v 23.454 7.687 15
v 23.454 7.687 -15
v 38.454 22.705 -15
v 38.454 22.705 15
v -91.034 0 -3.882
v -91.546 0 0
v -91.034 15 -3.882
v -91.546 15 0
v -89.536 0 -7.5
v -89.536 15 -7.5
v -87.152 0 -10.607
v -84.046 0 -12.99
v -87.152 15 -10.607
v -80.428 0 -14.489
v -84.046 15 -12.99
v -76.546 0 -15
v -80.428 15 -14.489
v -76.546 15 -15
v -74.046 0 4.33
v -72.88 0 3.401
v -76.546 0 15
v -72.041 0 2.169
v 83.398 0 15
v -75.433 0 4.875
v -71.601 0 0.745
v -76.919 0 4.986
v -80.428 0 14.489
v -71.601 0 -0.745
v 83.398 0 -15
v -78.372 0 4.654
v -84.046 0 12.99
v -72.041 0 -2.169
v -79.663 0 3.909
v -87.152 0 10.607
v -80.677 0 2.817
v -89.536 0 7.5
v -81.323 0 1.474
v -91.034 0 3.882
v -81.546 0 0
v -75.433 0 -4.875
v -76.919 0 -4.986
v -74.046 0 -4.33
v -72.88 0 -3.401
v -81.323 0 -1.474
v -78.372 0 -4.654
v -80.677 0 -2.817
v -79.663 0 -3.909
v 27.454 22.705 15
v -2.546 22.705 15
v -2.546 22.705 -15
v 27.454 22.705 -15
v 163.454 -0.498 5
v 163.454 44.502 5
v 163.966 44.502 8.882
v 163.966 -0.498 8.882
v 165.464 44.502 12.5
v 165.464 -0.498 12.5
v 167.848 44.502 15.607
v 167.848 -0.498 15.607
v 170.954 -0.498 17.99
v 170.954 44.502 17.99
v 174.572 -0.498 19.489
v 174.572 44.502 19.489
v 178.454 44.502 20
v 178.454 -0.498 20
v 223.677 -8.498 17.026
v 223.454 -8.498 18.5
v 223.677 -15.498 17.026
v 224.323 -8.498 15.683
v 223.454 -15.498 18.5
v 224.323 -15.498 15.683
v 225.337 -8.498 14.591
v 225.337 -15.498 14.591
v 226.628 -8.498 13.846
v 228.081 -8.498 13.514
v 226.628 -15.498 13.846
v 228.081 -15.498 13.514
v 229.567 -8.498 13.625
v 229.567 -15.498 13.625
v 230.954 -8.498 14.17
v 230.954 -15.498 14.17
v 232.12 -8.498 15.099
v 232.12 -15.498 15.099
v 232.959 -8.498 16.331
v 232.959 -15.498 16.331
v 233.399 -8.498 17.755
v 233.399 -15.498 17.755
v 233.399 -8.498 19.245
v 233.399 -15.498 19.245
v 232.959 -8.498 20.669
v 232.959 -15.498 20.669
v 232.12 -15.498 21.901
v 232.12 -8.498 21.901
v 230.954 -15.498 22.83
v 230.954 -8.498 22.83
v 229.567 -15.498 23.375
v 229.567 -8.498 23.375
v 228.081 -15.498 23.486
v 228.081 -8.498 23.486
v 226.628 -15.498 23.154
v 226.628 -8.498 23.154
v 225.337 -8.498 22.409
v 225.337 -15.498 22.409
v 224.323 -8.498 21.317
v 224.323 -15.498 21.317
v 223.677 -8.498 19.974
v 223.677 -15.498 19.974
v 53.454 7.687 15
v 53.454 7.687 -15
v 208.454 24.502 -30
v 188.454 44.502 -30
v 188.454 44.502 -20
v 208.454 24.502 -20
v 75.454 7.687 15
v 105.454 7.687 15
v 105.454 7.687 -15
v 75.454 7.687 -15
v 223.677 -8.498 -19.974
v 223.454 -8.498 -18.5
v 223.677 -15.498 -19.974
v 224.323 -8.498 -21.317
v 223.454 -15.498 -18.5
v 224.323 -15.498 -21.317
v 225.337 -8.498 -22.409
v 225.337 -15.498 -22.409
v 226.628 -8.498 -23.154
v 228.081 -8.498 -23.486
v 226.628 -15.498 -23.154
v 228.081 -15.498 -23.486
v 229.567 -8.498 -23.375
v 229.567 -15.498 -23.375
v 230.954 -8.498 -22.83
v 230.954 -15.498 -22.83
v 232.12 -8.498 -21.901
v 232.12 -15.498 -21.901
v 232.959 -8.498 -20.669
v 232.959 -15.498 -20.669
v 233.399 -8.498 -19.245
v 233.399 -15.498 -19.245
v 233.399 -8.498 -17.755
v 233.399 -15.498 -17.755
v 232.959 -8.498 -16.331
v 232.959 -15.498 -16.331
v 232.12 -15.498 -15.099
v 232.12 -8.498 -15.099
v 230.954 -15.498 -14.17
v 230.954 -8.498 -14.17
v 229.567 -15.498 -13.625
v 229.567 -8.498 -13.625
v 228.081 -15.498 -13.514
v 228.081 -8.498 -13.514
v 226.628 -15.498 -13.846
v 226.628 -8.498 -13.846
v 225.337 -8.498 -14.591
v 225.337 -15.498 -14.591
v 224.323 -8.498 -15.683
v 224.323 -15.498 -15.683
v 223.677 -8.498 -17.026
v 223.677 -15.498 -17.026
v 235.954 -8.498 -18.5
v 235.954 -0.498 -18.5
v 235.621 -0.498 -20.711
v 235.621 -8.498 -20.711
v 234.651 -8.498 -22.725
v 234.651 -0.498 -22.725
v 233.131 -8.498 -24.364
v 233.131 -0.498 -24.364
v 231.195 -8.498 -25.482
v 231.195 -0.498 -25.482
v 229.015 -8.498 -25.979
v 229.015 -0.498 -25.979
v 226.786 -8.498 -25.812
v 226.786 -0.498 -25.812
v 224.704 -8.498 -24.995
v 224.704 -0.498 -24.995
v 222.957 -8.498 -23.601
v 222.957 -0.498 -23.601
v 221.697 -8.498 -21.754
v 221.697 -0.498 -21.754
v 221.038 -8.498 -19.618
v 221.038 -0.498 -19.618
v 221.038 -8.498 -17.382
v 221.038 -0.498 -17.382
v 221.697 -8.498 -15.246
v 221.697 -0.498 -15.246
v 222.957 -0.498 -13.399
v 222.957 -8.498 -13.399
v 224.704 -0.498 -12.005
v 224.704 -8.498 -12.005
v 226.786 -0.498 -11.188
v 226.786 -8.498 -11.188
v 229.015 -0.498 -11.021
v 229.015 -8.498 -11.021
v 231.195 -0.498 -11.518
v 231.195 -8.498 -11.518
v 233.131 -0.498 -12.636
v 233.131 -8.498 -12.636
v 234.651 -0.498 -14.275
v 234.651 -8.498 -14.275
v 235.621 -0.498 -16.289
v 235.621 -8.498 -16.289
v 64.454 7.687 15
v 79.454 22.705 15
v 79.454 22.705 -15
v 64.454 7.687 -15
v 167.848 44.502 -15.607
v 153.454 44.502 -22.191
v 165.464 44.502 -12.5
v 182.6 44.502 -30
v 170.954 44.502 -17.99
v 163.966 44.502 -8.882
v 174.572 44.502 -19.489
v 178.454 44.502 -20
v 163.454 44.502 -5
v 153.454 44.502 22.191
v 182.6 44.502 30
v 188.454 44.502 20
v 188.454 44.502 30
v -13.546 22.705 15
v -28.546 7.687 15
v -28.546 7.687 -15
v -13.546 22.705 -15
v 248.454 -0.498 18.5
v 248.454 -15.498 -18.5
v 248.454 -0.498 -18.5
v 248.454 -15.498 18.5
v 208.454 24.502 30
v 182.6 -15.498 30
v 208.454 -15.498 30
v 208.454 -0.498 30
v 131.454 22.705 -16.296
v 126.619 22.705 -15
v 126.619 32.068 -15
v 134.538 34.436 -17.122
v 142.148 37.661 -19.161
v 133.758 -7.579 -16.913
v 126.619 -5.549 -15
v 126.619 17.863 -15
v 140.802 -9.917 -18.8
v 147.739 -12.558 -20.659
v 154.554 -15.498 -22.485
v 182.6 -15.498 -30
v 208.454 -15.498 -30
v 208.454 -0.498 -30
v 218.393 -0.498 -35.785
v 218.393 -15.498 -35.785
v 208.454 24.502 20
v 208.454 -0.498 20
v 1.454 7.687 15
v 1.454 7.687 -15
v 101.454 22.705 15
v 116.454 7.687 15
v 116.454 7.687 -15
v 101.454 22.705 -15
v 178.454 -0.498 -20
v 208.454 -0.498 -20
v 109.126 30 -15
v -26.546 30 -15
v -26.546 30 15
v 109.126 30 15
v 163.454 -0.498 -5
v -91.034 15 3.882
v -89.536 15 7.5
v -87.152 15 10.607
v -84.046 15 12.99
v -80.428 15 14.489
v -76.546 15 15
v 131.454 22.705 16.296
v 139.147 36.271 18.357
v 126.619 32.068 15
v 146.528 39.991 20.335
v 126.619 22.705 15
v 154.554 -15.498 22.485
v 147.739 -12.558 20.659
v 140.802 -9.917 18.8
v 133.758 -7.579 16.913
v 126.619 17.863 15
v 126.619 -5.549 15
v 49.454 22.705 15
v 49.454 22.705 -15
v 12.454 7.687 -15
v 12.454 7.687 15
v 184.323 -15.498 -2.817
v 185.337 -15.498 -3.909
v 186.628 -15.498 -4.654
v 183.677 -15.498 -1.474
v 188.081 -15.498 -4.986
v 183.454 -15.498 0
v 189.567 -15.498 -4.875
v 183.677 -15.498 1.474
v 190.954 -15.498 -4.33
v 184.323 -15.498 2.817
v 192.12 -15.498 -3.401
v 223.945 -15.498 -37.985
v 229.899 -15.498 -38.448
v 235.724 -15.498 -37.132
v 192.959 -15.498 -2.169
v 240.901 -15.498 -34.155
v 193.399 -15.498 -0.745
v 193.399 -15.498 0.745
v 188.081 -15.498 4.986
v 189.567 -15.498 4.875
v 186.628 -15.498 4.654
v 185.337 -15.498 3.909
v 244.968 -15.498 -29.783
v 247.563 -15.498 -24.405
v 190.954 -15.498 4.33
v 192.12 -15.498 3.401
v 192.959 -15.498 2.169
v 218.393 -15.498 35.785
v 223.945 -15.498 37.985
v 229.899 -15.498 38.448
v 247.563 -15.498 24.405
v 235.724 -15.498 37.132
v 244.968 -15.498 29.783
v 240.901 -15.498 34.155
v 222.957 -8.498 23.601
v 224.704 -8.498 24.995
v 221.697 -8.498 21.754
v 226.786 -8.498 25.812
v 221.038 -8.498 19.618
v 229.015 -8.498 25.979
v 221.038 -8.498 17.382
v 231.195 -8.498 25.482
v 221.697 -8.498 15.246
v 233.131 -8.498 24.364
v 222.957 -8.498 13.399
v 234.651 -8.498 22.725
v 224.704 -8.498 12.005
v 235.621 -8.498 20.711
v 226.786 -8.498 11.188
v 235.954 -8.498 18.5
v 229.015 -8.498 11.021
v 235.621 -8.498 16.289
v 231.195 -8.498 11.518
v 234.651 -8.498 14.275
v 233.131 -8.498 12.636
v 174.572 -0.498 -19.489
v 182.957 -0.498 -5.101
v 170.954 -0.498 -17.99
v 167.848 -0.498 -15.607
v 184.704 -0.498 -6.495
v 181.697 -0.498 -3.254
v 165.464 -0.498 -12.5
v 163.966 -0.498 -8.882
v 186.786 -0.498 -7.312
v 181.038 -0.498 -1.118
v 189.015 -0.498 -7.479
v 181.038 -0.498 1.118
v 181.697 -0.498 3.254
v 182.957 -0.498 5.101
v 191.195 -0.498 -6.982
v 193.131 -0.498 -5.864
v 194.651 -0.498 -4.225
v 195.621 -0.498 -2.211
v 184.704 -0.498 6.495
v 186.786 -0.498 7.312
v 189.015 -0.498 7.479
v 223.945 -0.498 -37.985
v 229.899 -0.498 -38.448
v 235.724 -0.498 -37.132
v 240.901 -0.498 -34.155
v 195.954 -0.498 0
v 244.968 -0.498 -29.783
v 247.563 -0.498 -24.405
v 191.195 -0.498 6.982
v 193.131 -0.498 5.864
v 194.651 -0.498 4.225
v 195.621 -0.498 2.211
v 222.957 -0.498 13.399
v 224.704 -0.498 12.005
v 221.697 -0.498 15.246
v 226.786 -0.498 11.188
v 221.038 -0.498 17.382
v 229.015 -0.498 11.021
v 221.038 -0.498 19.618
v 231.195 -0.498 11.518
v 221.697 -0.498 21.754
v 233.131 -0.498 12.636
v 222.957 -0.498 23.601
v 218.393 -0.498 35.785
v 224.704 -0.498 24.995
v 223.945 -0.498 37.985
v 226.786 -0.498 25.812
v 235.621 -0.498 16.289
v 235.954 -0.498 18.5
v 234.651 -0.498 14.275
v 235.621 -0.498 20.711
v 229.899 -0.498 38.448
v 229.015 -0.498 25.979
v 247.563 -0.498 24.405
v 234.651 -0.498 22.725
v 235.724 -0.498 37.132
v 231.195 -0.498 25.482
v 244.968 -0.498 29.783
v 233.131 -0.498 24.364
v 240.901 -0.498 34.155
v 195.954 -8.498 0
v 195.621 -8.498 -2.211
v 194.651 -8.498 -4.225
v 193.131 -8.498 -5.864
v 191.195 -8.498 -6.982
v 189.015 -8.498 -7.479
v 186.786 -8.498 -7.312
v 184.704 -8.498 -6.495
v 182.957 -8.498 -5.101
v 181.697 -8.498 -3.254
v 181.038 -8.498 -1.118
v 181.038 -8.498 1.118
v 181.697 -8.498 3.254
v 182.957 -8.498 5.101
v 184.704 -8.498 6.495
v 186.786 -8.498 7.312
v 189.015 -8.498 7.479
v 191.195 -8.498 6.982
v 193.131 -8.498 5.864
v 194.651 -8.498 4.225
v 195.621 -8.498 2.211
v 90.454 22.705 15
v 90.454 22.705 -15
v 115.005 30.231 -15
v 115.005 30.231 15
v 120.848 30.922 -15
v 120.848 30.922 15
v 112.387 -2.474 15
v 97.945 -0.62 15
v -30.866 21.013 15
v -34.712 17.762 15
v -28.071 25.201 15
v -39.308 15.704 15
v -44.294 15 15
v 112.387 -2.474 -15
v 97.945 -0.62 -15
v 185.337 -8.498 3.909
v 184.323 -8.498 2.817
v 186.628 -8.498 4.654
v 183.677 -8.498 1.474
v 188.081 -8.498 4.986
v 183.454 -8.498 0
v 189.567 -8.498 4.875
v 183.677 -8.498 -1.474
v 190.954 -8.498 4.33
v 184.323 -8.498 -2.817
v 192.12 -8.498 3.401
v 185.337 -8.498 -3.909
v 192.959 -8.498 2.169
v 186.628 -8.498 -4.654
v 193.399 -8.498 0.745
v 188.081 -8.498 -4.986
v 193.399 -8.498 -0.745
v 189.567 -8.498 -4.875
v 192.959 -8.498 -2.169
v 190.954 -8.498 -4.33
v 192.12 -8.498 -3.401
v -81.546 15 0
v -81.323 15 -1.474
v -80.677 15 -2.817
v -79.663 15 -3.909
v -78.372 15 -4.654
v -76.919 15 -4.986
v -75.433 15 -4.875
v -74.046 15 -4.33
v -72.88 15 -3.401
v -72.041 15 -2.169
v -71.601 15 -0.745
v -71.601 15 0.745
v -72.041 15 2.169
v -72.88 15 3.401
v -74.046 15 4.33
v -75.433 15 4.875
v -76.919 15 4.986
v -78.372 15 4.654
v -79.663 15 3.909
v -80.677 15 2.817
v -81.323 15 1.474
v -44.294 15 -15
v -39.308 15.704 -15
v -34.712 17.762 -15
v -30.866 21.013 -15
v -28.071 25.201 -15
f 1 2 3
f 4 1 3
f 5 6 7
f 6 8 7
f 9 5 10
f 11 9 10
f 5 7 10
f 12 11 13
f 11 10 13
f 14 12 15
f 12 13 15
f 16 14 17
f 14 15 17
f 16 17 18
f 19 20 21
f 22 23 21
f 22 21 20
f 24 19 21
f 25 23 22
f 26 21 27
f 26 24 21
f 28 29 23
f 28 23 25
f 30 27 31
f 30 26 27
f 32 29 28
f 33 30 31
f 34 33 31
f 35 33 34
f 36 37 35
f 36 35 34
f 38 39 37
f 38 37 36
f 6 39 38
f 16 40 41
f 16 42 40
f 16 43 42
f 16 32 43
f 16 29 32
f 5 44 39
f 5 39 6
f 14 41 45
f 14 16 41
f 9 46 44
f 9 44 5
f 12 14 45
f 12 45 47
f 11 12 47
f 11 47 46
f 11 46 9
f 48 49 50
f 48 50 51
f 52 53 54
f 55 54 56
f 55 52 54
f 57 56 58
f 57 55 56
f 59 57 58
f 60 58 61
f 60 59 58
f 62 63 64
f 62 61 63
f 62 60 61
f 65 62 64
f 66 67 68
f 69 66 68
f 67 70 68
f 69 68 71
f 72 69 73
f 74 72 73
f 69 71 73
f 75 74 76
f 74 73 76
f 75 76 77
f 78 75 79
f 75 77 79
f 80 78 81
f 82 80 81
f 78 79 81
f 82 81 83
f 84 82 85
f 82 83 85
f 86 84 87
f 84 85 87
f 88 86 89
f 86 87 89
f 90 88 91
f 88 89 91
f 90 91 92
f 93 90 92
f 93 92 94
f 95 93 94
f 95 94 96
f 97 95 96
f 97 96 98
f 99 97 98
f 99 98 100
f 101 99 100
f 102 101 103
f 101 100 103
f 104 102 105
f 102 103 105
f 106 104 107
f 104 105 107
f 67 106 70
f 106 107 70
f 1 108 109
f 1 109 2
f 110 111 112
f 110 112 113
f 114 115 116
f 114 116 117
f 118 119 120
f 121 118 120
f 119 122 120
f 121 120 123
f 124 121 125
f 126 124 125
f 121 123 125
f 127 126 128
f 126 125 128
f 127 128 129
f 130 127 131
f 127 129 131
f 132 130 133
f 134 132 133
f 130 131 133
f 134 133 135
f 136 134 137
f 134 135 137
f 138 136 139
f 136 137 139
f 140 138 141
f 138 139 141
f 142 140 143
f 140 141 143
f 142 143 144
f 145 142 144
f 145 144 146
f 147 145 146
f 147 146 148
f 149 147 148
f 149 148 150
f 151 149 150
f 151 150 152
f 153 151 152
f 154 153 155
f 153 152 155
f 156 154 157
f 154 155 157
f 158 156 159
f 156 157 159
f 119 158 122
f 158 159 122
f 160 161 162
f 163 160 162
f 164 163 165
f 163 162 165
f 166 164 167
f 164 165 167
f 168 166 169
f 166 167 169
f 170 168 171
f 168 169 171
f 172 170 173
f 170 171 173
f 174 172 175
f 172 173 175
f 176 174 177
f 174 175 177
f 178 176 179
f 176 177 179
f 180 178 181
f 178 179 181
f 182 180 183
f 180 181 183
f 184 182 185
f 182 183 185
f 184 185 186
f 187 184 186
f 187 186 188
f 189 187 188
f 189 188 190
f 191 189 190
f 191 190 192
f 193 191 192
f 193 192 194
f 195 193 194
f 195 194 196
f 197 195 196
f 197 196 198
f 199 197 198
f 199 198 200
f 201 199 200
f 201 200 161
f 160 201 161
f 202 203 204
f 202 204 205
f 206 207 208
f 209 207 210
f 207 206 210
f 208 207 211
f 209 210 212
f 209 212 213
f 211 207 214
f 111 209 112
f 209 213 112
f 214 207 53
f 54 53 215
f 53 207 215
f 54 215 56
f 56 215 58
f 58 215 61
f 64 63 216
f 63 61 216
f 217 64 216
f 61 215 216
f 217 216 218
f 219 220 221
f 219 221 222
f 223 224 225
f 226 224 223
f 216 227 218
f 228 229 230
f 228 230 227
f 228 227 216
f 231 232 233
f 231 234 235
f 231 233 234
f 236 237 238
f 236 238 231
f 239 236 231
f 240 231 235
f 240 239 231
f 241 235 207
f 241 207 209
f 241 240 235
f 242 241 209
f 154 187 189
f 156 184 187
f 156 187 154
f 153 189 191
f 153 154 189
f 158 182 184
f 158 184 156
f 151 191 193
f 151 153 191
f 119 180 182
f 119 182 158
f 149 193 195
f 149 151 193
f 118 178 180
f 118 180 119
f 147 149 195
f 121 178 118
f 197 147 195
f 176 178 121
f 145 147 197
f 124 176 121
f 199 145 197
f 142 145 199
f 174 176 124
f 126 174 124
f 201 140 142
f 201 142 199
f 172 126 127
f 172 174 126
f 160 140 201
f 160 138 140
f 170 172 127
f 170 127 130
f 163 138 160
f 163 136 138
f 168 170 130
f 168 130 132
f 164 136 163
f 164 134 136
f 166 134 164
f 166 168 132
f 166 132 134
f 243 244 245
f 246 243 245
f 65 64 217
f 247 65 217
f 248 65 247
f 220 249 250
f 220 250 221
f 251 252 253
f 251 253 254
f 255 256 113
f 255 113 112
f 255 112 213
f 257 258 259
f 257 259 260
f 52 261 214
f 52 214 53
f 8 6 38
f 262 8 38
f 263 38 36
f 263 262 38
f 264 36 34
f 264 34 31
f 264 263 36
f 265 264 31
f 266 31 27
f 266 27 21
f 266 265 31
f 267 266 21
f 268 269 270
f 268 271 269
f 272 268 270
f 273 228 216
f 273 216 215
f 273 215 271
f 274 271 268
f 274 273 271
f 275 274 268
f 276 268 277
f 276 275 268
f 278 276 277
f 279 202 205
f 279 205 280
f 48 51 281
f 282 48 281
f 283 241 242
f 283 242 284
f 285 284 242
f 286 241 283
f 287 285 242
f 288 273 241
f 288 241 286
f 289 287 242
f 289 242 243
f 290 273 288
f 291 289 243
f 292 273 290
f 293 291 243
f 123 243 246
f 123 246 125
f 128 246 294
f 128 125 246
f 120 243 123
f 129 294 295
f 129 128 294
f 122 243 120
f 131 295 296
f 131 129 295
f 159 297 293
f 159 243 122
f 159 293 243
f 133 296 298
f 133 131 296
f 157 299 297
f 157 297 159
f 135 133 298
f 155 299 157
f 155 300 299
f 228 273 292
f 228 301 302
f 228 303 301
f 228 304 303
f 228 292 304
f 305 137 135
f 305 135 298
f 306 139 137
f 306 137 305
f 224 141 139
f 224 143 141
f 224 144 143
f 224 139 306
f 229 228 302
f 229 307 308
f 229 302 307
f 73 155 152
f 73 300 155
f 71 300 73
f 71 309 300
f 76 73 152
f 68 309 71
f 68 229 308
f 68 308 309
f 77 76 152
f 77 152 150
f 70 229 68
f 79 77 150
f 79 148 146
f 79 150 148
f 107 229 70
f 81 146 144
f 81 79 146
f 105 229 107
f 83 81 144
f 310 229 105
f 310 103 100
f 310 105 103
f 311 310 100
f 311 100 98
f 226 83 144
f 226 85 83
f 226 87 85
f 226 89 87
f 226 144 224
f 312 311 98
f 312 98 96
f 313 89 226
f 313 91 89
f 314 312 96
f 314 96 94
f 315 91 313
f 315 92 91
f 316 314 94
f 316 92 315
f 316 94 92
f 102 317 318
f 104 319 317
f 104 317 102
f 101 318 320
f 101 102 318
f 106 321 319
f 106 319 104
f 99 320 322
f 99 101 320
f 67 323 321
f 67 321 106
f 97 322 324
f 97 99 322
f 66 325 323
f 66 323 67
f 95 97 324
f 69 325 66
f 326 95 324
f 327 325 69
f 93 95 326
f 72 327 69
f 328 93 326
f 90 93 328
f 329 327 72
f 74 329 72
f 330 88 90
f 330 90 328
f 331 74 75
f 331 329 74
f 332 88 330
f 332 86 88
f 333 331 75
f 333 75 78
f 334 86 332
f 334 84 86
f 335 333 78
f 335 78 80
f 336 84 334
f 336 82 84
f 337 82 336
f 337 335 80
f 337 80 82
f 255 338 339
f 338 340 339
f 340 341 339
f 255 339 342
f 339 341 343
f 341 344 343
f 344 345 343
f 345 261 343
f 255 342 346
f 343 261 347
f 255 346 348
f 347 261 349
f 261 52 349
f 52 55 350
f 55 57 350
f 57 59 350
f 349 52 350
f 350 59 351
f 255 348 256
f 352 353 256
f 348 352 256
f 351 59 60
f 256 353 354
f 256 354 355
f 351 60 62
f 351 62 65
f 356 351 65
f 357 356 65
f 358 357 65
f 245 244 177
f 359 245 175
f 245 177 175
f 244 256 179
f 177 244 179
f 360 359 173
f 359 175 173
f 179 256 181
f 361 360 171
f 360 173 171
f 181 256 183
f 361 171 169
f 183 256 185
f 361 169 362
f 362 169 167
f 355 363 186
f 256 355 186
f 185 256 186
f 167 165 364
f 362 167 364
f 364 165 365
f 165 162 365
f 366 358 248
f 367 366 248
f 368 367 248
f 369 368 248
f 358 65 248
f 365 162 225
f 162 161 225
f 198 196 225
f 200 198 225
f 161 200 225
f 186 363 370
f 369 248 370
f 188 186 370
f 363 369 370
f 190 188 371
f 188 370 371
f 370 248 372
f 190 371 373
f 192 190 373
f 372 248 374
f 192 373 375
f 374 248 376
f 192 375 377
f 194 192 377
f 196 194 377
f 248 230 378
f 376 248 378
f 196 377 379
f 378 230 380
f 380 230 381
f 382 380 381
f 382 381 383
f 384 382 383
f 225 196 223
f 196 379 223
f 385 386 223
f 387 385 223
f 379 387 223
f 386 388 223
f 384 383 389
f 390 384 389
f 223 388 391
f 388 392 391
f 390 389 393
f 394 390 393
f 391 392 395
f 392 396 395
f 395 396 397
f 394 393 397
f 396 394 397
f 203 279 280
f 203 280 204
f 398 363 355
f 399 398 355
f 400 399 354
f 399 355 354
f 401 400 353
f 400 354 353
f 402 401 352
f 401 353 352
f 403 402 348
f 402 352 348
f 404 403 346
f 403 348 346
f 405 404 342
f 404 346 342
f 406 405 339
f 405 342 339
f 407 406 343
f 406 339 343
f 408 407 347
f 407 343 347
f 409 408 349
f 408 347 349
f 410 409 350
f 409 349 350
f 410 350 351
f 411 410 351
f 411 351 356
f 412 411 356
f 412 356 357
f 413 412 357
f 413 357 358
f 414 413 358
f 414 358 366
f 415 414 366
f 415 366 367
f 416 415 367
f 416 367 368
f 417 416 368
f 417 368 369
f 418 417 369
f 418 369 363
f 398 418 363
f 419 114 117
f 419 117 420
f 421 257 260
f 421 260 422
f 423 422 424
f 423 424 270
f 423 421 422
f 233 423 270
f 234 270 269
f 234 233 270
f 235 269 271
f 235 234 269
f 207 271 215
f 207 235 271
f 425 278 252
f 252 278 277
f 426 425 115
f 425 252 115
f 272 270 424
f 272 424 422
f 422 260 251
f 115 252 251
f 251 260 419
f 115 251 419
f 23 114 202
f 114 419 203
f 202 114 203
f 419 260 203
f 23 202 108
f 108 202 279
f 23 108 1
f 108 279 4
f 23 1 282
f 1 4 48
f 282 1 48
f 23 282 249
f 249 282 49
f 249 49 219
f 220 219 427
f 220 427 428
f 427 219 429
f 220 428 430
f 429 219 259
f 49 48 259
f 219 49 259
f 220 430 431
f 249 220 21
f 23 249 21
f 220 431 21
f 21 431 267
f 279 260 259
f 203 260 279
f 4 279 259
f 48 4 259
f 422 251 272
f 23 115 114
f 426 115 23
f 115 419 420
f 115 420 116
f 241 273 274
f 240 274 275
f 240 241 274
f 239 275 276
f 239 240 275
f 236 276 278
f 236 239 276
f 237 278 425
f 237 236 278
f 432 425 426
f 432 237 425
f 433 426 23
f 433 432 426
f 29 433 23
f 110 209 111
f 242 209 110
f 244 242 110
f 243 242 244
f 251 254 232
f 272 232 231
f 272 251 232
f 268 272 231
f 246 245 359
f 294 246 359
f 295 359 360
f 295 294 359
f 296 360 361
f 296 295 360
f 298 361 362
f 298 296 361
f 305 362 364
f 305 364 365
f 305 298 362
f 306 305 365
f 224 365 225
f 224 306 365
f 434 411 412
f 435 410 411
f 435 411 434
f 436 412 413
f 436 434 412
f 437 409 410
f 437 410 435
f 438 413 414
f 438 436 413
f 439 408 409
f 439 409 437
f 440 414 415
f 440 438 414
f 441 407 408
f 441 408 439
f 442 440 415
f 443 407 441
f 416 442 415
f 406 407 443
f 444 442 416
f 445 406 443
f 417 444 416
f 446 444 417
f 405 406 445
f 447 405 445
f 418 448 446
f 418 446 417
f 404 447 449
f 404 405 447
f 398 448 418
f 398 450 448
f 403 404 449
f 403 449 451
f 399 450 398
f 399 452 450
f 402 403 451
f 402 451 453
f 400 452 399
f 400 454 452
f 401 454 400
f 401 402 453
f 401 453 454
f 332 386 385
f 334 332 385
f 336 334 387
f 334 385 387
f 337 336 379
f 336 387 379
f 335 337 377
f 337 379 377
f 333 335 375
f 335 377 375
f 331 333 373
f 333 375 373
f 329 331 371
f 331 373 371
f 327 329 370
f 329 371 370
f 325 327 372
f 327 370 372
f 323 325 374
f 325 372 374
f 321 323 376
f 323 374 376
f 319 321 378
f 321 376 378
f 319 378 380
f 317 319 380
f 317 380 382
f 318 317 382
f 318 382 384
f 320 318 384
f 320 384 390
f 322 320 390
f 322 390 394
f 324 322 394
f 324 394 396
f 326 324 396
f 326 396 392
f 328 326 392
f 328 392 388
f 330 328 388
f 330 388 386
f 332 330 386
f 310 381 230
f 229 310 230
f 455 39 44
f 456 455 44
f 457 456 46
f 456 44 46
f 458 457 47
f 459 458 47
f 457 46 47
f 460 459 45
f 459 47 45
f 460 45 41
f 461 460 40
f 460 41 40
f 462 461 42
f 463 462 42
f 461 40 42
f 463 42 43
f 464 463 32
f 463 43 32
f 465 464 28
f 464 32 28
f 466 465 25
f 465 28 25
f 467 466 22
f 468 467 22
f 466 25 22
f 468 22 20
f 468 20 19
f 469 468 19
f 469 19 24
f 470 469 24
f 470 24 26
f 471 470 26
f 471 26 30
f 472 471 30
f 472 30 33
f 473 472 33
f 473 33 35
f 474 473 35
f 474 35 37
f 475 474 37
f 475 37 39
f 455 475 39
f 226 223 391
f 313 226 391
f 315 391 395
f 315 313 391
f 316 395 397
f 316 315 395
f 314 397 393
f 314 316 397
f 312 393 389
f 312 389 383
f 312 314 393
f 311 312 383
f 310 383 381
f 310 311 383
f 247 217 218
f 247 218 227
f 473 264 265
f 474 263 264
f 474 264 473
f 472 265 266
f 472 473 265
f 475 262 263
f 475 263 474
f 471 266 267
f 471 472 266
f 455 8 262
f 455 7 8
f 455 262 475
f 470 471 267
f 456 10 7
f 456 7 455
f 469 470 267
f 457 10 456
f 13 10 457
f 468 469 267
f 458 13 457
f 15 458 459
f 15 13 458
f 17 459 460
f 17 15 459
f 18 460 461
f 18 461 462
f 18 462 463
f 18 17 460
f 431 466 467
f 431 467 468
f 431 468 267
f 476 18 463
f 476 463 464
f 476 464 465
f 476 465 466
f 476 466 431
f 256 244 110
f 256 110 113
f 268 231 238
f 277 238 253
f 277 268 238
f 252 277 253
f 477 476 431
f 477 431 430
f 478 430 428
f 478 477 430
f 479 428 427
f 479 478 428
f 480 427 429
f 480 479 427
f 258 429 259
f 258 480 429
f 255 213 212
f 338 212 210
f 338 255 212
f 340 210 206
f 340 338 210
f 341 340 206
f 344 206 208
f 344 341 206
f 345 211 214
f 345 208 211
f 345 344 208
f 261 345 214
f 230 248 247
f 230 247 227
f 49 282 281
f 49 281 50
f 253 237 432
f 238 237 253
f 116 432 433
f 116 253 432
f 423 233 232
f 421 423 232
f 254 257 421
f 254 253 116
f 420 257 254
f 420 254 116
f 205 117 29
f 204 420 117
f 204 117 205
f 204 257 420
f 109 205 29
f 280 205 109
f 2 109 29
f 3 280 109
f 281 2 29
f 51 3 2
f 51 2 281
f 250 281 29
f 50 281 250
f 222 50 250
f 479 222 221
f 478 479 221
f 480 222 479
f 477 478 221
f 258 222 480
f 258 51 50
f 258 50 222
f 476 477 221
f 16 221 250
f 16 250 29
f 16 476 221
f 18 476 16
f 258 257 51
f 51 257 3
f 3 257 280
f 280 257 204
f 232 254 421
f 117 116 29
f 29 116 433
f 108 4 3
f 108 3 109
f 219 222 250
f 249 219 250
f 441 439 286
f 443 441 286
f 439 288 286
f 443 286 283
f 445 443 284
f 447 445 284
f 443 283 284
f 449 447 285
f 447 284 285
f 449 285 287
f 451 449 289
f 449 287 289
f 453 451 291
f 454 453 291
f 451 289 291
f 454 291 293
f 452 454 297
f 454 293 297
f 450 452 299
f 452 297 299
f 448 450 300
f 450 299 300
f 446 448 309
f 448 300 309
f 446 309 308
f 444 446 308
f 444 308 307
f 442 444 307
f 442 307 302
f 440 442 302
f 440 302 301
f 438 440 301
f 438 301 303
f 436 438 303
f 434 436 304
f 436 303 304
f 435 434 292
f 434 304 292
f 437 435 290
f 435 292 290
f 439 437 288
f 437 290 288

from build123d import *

# Parameters (mm, degrees)
BOSS_EXTRUDE1_DEPTH                     = 15
BOSS_EXTRUDE1_DEPTH_BACK                = 15
FILLET1_R                               = 15
BOSS_EXTRUDE2_DEPTH                     = 60
CUT_EXTRUDE5_DEPTH                      = 43
CUT_EXTRUDE5_DEPTH_BACK                 = 43
SKETCH1_6_OUTSIDE_W                     = 364.354
SKETCH1_6_OUTSIDE_H                     = 124.354
BOSS_EXTRUDE3_DEPTH                     = 15
CUT_EXTRUDE7_DEPTH                      = 256.415087263
CBORE_FOR_M5_HEX_HEAD_BOLT1_D           = 10
CBORE_FOR_M5_HEX_HEAD_BOLT1_DEPTH       = 20
CBORE_FOR_M5_HEX_HEAD_BOLT1_CBORE_D     = 15
CBORE_FOR_M5_HEX_HEAD_BOLT1_CBORE_DEPTH = 8
CBORE_FOR_M5_HEX_HEAD_BOLT1_TIP         = 3.004303095
F_10_0MM_DOWEL_HOLE1_D                  = 10
CUT_EXTRUDE9_DEPTH                      = 259.016066246
CUT_EXTRUDE14_DEPTH                     = 259.016066246


with BuildPart() as part:
    # Sketch1 → Boss-Extrude1 (new, two sides: drawn at the far end of the back side and taken through both)
    with BuildSketch(Plane.XY.offset(-BOSS_EXTRUDE1_DEPTH_BACK)):
        with BuildLine():
            Line((0, 0), (-91.545543809, 0))
            Line((-91.545543809, 0), (-91.545543809, 15))
            Line((-91.545543809, 15), (-44.293783158, 15))
            ThreePointArc((-44.293783158, 15), (-32.674833119, 19.252272915), (-26.545543809, 30))
            Line((-26.545543809, 30), (109.126292876, 30))
            ThreePointArc((109.126292876, 30), (132.446309196, 33.71762603), (153.454456191, 44.501950965))
            Line((153.454456191, 44.501950965), (188.454456191, 44.501950965))
            Line((188.454456191, 44.501950965), (208.454456191, 24.501950965))
            Line((208.454456191, 24.501950965), (208.454456191, 0))
            Line((208.454456191, 0), (208.454456191, -15.498049035))
            Line((208.454456191, -15.498049035), (154.553796185, -15.498049035))
            ThreePointArc((154.553796185, -15.498049035), (119.809900794, -3.919403897), (83.397793421, 0))
            Line((83.397793421, 0), (0, 0))
        make_face()
    extrude(amount=BOSS_EXTRUDE1_DEPTH + BOSS_EXTRUDE1_DEPTH_BACK)

    # Fillet1
    fillet1_edges = [part.edges().sort_by_distance(p)[0] for p in [
        (-91.545543809, 7.5, 15),
        (-91.545543809, 7.5, -15),
    ]]
    fillet(fillet1_edges, radius=FILLET1_R - 0.0001)  # a hair under: the kernel refuses the full size

    # Sketch2 → Boss-Extrude2 (add)
    with BuildSketch(Plane.XZ.offset(15.498049035)):
        Polygon((126.618755864, -15), (153.454456191, -22.190604231), (182.599517977, -30), (208.454456191, -30), (208.454456191, 30), (182.599517977, 30), (153.454456191, 22.190604231), (126.618755864, 15), align=None)
    extrude(amount=-BOSS_EXTRUDE2_DEPTH)

    # Sketch1<6> outside → Cut-Extrude5 (cut, two sides: drawn at the far end of the back side and taken through both)
    with BuildSketch(Plane.XY.offset(-CUT_EXTRUDE5_DEPTH_BACK)):
        with Locations((58.454, 14.502)):
            Rectangle(SKETCH1_6_OUTSIDE_W, SKETCH1_6_OUTSIDE_H)
        with BuildLine():
            Line((0, 0), (-91.545543809, 0))
            Line((-91.545543809, 0), (-91.545543809, 15))
            Line((-91.545543809, 15), (-44.293783158, 15))
            ThreePointArc((-44.293783158, 15), (-32.674833119, 19.252272915), (-26.545543809, 30))
            Line((-26.545543809, 30), (109.126292876, 30))
            ThreePointArc((109.126292876, 30), (132.446309196, 33.71762603), (153.454456191, 44.501950965))
            Line((153.454456191, 44.501950965), (188.454456191, 44.501950965))
            Line((188.454456191, 44.501950965), (208.454456191, 24.501950965))
            Line((208.454456191, 24.501950965), (208.454456191, 0))
            Line((208.454456191, 0), (208.454456191, -15.498049035))
            Line((208.454456191, -15.498049035), (154.553796185, -15.498049035))
            ThreePointArc((154.553796185, -15.498049035), (119.809900794, -3.919403897), (83.397793421, 0))
            Line((83.397793421, 0), (0, 0))
        make_face(mode=Mode.SUBTRACT)
    extrude(amount=CUT_EXTRUDE5_DEPTH + CUT_EXTRUDE5_DEPTH_BACK, mode=Mode.SUBTRACT)

    # Sketch3 → Boss-Extrude3 (add)
    with BuildSketch(Plane.XZ.offset(15.498049035)):
        with BuildLine():
            Line((208.454456191, -30), (218.39339466, -35.78511038))
            ThreePointArc((218.39339466, -35.78511038), (238.423878677, -35.838126061), (248.454456191, -18.5))
            Line((248.454456191, -18.5), (248.454456191, 18.5))
            ThreePointArc((248.454456191, 18.5), (238.423878677, 35.838126061), (218.39339466, 35.78511038))
            Line((218.39339466, 35.78511038), (208.454456191, 30))
            Line((208.454456191, 30), (208.454456191, -30))
        make_face()
    extrude(amount=-BOSS_EXTRUDE3_DEPTH)

    # Sketch4 → Cut-Extrude7 (cut, through all)
    with BuildSketch(Plane(origin=(0, -0.498049035, 0), x_dir=(1, 0, 0), z_dir=(0, 1, 0))):
        with BuildLine():
            Line((208.454456191, 20), (178.454456191, 20))
            ThreePointArc((178.454456191, 20), (167.847854474, 15.606601718), (163.454456191, 5))
            Line((163.454456191, 5), (163.454456191, -5))
            ThreePointArc((163.454456191, -5), (167.847854474, -15.606601718), (178.454456191, -20))
            Line((178.454456191, -20), (208.454456191, -20))
            Line((208.454456191, -20), (208.454456191, 20))
        make_face()
    extrude(amount=CUT_EXTRUDE7_DEPTH, mode=Mode.SUBTRACT)

    # CBORE for M5 Hex Head Bolt1
    with Locations(Plane(origin=(0, -0.498049035, 0), x_dir=(1, 0, 0), z_dir=(0, 1, 0))):
        with Locations((188.454456191, 0), (228.454456191, 18.5), (228.454456191, -18.5)):
            CounterBoreHole(CBORE_FOR_M5_HEX_HEAD_BOLT1_D / 2, CBORE_FOR_M5_HEX_HEAD_BOLT1_CBORE_D / 2, CBORE_FOR_M5_HEX_HEAD_BOLT1_CBORE_DEPTH, depth=CBORE_FOR_M5_HEX_HEAD_BOLT1_DEPTH)
            with Locations((0, 0, -(CBORE_FOR_M5_HEX_HEAD_BOLT1_DEPTH + CBORE_FOR_M5_HEX_HEAD_BOLT1_TIP / 2))):  # 118° drill point
                Cone(0, CBORE_FOR_M5_HEX_HEAD_BOLT1_D / 2, CBORE_FOR_M5_HEX_HEAD_BOLT1_TIP, mode=Mode.SUBTRACT)

    # Ø10.0mm Dowel Hole1 (through all)
    with Locations(Plane(origin=(0, 15, 0), x_dir=(1, 0, 0), z_dir=(0, 1, 0))):
        with Locations((-76.545543809, 0)):
            Hole(F_10_0MM_DOWEL_HOLE1_D / 2)

    # Sketch14 → Cut-Extrude9 (cut, through all)
    with BuildSketch(Plane.XY.offset(15)):
        Polygon((-28.545543809, 7.687067678), (-13.545543809, 22.704940786), (1.454456191, 7.687067678), align=None)
        Polygon((12.454456191, 7.687067678), (-2.545543809, 22.704940786), (27.454456191, 22.704940786), align=None)
        Polygon((49.454456191, 22.704940786), (79.454456191, 22.704940786), (64.454456191, 7.687067678), align=None)
        Polygon((23.454456191, 7.687067678), (38.454456191, 22.704940786), (53.454456191, 7.687067678), align=None)
        Polygon((75.454456191, 7.687067678), (90.454456191, 22.704940786), (105.454456191, 7.687067678), align=None)
        Polygon((116.454456191, 7.687067678), (101.454456191, 22.704940786), (131.454456191, 22.704940786), align=None)
    extrude(amount=-CUT_EXTRUDE9_DEPTH, mode=Mode.SUBTRACT)

    # Sketch14<3> → Cut-Extrude14 (cut, through all)
    with BuildSketch(Plane.XY.offset(15)):
        Polygon((116.454456191, 7.687067678), (101.454456191, 22.704940786), (131.454456191, 22.704940786), align=None)
    extrude(amount=CUT_EXTRUDE14_DEPTH, mode=Mode.SUBTRACT)


solid = part.part
